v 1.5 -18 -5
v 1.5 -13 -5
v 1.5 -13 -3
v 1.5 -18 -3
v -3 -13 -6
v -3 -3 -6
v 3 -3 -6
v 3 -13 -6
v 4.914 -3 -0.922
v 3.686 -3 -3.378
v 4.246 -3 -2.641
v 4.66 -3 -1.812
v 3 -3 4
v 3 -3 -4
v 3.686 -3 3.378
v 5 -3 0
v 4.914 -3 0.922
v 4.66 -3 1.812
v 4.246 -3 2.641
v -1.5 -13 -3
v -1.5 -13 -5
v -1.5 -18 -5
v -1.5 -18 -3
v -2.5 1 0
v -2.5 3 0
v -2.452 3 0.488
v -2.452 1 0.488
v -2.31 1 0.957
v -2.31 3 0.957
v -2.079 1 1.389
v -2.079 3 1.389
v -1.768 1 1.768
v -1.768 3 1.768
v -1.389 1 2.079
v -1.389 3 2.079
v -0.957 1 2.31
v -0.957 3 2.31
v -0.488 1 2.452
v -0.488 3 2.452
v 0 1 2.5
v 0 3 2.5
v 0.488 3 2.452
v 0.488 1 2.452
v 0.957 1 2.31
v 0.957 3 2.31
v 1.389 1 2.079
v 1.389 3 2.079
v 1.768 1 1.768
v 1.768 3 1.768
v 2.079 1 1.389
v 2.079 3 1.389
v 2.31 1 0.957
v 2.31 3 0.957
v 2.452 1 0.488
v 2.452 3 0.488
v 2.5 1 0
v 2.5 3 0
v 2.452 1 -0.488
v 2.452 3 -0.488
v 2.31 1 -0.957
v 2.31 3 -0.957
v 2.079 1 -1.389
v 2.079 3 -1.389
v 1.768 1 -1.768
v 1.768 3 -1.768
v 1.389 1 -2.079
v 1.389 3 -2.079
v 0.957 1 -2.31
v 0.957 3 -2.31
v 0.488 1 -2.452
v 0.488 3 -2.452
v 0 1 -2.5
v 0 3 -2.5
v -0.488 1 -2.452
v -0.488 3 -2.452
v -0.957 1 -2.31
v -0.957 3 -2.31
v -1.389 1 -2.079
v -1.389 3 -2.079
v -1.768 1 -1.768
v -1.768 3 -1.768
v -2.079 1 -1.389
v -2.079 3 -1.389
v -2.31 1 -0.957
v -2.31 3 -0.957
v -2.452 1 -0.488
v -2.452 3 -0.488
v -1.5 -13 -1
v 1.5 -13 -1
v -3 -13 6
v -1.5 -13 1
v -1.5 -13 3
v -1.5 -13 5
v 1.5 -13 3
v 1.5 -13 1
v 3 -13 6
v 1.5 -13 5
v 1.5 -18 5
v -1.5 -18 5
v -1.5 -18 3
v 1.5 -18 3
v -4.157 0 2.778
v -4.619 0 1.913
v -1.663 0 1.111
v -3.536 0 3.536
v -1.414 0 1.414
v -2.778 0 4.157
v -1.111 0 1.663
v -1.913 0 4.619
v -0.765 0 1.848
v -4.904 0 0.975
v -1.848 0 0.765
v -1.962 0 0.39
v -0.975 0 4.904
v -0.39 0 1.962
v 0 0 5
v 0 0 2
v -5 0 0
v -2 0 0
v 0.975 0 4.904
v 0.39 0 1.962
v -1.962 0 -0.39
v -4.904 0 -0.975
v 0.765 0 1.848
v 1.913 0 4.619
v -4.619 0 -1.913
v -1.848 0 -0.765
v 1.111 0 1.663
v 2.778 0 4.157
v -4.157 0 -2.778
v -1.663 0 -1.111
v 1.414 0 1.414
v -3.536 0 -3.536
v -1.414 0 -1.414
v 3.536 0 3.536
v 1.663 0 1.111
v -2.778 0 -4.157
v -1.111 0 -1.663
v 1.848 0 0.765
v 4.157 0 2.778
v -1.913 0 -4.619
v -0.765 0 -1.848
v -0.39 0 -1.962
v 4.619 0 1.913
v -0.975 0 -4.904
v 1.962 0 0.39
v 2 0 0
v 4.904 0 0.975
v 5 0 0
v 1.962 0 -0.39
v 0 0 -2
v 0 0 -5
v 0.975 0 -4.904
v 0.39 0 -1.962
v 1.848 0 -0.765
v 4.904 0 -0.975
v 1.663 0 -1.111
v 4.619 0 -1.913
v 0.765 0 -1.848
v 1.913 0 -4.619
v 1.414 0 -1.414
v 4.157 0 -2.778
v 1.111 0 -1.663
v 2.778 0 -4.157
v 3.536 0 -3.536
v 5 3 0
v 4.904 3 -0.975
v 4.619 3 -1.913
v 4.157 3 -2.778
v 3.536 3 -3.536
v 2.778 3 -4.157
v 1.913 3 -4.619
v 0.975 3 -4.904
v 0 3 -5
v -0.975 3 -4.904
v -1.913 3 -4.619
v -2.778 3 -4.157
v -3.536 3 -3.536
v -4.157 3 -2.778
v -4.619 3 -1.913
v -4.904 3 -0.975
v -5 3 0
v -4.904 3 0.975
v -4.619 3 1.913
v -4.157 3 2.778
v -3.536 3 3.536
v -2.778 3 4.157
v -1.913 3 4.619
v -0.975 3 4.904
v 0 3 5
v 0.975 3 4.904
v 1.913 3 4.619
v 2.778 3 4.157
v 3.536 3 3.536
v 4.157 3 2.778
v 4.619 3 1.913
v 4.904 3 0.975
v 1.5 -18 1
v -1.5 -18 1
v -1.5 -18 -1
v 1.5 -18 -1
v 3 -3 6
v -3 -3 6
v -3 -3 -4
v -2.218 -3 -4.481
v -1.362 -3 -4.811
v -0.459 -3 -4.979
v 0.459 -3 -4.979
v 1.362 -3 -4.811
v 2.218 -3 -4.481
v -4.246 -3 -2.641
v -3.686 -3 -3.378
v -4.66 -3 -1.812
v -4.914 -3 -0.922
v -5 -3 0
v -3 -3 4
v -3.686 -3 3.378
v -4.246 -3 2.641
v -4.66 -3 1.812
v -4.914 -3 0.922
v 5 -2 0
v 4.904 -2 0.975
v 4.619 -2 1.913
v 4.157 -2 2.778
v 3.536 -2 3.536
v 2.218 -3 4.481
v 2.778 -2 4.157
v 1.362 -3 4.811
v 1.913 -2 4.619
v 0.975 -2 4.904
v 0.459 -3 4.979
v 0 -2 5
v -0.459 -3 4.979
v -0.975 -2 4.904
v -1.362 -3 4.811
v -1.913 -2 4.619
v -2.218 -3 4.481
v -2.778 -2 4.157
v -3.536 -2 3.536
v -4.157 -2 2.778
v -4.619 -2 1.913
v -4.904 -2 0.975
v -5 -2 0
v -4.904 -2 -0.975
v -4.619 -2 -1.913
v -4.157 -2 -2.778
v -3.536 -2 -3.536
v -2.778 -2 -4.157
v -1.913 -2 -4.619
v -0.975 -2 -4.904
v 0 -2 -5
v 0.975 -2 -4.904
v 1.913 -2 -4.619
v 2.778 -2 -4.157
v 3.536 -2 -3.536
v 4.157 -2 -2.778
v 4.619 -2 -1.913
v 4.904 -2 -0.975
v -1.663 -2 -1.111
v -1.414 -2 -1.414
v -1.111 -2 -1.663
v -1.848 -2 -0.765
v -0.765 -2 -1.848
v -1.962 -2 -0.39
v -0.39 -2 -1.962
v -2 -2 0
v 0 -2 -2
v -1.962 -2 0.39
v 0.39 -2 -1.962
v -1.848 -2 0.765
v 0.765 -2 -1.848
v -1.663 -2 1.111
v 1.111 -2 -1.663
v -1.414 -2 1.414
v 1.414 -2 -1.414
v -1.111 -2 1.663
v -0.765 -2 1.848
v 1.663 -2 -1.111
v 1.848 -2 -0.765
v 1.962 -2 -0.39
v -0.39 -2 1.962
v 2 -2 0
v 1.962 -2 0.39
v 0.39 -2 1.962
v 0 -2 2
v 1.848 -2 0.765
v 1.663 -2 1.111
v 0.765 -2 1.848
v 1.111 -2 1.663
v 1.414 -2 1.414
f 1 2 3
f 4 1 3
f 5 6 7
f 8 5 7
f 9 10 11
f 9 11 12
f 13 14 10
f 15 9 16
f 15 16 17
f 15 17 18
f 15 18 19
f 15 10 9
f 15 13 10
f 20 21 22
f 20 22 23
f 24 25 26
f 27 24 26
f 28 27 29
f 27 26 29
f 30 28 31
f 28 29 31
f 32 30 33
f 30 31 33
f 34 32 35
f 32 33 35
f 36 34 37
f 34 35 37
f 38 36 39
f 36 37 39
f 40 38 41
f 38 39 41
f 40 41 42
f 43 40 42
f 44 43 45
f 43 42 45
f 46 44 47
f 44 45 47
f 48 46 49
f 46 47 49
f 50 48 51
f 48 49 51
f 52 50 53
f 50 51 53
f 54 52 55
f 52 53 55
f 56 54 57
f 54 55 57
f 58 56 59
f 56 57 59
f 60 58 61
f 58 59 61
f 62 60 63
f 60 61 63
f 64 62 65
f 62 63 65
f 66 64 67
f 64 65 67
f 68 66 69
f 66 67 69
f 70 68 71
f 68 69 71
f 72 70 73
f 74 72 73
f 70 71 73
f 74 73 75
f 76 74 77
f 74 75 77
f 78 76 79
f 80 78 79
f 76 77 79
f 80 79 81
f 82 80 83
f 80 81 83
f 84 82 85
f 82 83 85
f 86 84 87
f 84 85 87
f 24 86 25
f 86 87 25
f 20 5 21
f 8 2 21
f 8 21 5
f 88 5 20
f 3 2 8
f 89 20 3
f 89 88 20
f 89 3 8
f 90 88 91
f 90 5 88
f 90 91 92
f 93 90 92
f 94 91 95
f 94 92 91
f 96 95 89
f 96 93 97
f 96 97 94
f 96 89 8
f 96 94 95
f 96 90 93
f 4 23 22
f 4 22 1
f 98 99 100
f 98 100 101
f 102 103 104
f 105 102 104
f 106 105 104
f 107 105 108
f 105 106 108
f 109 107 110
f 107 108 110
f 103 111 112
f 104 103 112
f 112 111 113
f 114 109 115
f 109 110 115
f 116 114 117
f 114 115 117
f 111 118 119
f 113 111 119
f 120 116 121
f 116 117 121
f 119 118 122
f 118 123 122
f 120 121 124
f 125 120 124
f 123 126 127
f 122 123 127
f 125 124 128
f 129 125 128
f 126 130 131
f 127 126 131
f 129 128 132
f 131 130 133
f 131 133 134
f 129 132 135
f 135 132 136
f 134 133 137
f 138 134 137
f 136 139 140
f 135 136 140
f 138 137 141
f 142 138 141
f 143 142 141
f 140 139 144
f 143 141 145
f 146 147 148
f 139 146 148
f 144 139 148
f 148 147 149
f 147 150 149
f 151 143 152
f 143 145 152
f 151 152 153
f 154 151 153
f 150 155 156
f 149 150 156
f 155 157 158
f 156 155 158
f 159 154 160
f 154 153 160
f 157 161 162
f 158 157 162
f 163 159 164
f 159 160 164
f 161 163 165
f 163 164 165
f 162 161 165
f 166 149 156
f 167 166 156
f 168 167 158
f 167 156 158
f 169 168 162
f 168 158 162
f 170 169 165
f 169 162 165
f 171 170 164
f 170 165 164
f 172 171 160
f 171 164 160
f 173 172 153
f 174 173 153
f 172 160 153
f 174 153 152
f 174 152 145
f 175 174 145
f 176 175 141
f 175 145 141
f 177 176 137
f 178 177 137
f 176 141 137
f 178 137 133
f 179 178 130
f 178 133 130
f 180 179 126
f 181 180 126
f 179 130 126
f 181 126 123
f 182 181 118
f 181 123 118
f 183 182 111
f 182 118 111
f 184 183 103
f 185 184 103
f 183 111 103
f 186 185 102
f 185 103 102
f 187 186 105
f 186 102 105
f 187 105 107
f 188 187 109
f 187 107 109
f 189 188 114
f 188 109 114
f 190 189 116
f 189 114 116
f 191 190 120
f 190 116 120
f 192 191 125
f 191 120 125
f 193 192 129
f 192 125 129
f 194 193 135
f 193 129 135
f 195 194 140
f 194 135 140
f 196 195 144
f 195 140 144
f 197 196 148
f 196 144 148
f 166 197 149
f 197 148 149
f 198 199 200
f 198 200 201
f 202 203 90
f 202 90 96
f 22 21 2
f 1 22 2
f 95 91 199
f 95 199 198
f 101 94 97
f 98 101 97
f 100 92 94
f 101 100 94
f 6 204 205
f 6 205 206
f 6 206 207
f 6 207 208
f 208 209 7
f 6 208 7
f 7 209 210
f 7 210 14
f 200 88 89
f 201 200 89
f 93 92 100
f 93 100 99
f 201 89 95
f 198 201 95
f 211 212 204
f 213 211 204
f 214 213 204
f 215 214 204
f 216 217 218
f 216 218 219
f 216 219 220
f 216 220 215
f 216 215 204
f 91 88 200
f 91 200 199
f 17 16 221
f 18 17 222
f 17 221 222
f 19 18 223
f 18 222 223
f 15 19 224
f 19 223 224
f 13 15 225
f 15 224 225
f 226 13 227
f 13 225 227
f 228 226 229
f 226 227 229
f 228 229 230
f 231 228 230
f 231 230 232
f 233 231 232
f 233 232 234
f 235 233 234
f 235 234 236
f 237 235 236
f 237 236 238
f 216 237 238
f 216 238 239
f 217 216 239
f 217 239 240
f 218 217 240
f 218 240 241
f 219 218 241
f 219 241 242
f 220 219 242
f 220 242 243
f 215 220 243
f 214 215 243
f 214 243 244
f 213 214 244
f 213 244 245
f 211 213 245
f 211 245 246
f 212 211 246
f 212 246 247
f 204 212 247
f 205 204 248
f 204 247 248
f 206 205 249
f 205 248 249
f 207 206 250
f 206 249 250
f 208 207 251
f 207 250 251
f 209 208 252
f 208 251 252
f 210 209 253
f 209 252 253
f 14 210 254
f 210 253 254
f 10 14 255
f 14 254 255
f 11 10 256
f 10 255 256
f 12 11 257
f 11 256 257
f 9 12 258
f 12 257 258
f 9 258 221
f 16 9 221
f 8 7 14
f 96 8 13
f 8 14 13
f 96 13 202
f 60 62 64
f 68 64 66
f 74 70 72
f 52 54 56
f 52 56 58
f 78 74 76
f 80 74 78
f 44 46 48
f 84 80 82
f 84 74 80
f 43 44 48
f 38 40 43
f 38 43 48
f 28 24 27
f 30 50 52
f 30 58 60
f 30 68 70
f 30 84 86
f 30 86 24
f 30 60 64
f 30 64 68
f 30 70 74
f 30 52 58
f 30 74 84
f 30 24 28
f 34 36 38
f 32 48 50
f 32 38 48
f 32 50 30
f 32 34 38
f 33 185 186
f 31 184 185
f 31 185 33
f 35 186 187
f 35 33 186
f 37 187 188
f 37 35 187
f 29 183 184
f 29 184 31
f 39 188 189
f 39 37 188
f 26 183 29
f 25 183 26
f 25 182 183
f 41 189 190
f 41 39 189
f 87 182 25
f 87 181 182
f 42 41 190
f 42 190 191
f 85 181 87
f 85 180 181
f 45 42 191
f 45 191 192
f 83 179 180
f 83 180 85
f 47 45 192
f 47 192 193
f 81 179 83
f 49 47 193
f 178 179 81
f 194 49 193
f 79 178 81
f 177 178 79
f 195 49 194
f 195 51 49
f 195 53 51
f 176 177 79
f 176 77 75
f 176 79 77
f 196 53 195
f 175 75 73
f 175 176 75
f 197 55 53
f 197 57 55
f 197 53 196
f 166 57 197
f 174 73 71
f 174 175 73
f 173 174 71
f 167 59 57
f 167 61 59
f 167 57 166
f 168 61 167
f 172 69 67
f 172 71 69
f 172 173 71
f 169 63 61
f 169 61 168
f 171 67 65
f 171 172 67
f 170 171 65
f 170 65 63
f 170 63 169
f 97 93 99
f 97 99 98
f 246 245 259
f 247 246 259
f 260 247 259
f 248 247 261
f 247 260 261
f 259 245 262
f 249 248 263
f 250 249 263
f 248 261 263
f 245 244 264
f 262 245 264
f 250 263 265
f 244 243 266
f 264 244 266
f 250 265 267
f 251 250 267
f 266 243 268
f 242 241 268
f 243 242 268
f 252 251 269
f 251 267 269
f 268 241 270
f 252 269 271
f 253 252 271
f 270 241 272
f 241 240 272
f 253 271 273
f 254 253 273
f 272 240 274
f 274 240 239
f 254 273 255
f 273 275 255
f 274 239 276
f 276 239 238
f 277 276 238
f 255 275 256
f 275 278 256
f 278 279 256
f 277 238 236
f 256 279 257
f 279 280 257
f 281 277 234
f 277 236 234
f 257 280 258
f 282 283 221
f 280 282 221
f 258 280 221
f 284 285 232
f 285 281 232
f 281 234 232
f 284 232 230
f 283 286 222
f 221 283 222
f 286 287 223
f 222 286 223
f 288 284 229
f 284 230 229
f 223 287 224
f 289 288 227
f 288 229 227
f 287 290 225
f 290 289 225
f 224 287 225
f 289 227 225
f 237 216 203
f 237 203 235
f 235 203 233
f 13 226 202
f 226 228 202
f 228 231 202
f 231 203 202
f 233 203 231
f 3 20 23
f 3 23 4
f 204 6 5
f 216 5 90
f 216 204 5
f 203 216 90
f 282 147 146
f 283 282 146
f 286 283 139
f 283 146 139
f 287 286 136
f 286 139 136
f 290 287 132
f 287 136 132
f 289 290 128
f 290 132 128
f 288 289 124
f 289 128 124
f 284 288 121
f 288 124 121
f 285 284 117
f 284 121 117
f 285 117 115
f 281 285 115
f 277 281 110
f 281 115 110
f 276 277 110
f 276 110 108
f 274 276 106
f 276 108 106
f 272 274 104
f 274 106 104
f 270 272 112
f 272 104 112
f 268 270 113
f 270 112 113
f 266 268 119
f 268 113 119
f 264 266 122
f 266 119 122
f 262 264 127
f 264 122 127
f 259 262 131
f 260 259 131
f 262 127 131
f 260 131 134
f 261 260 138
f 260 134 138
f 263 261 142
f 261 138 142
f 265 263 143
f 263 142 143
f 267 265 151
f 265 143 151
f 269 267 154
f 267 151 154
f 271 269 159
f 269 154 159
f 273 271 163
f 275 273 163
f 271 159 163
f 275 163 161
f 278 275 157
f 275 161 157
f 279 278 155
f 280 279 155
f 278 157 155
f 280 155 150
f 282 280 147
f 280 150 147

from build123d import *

# Parameters (mm, degrees)
ESQUISSE1_R      = 5
EXTRUSION1_DEPTH = 3
ESQUISSE3_R      = 2
EXTRUSION3_DEPTH = 2
ESQUISSE4_R      = 5
EXTRUSION4_DEPTH = 1
ESQUISSE5_W      = 6
ESQUISSE5_H      = 12
EXTRUSION5_DEPTH = 10
ESQUISSE6_W      = 3
ESQUISSE6_H      = 2
EXTRUSION6_DEPTH = 5
ESQUISSE2_R      = 2.5
EXTRUSION7_DEPTH = 2


with BuildPart() as part:
    # Esquisse1 → Extrusion1 (new body)
    with BuildSketch(Plane(origin=(0, 0, 0), x_dir=(1, 0, 0), z_dir=(0, 1, 0))):
        Circle(ESQUISSE1_R)
    extrude(amount=EXTRUSION1_DEPTH)

    # Esquisse3 → Extrusion3 (add)
    with BuildSketch(Plane.XZ):
        Circle(ESQUISSE3_R)
    extrude(amount=EXTRUSION3_DEPTH)

    # Esquisse4 → Extrusion4 (add)
    with BuildSketch(Plane.XZ.offset(2)):
        Circle(ESQUISSE4_R)
    extrude(amount=EXTRUSION4_DEPTH)

    # Esquisse5 → Extrusion5 (add)
    with BuildSketch(Plane.XZ.offset(3)):
        Rectangle(ESQUISSE5_W, ESQUISSE5_H)
    extrude(amount=EXTRUSION5_DEPTH)

    # Esquisse6 → Extrusion6 (add)
    with BuildSketch(Plane.XZ.offset(13)):
        with Locations((0, 4)):
            Rectangle(ESQUISSE6_W, ESQUISSE6_H)
        Rectangle(ESQUISSE6_W, ESQUISSE6_H)
        with Locations((0, -4)):
            Rectangle(ESQUISSE6_W, ESQUISSE6_H)
    extrude(amount=EXTRUSION6_DEPTH)

    # Esquisse2 → Extrusion7 (cut)
    with BuildSketch(Plane(origin=(0, 3, 0), x_dir=(-1, 0, 0), z_dir=(0, 1, 0))):
        Circle(ESQUISSE2_R)
    extrude(amount=-EXTRUSION7_DEPTH, mode=Mode.SUBTRACT)


solid = part.part
